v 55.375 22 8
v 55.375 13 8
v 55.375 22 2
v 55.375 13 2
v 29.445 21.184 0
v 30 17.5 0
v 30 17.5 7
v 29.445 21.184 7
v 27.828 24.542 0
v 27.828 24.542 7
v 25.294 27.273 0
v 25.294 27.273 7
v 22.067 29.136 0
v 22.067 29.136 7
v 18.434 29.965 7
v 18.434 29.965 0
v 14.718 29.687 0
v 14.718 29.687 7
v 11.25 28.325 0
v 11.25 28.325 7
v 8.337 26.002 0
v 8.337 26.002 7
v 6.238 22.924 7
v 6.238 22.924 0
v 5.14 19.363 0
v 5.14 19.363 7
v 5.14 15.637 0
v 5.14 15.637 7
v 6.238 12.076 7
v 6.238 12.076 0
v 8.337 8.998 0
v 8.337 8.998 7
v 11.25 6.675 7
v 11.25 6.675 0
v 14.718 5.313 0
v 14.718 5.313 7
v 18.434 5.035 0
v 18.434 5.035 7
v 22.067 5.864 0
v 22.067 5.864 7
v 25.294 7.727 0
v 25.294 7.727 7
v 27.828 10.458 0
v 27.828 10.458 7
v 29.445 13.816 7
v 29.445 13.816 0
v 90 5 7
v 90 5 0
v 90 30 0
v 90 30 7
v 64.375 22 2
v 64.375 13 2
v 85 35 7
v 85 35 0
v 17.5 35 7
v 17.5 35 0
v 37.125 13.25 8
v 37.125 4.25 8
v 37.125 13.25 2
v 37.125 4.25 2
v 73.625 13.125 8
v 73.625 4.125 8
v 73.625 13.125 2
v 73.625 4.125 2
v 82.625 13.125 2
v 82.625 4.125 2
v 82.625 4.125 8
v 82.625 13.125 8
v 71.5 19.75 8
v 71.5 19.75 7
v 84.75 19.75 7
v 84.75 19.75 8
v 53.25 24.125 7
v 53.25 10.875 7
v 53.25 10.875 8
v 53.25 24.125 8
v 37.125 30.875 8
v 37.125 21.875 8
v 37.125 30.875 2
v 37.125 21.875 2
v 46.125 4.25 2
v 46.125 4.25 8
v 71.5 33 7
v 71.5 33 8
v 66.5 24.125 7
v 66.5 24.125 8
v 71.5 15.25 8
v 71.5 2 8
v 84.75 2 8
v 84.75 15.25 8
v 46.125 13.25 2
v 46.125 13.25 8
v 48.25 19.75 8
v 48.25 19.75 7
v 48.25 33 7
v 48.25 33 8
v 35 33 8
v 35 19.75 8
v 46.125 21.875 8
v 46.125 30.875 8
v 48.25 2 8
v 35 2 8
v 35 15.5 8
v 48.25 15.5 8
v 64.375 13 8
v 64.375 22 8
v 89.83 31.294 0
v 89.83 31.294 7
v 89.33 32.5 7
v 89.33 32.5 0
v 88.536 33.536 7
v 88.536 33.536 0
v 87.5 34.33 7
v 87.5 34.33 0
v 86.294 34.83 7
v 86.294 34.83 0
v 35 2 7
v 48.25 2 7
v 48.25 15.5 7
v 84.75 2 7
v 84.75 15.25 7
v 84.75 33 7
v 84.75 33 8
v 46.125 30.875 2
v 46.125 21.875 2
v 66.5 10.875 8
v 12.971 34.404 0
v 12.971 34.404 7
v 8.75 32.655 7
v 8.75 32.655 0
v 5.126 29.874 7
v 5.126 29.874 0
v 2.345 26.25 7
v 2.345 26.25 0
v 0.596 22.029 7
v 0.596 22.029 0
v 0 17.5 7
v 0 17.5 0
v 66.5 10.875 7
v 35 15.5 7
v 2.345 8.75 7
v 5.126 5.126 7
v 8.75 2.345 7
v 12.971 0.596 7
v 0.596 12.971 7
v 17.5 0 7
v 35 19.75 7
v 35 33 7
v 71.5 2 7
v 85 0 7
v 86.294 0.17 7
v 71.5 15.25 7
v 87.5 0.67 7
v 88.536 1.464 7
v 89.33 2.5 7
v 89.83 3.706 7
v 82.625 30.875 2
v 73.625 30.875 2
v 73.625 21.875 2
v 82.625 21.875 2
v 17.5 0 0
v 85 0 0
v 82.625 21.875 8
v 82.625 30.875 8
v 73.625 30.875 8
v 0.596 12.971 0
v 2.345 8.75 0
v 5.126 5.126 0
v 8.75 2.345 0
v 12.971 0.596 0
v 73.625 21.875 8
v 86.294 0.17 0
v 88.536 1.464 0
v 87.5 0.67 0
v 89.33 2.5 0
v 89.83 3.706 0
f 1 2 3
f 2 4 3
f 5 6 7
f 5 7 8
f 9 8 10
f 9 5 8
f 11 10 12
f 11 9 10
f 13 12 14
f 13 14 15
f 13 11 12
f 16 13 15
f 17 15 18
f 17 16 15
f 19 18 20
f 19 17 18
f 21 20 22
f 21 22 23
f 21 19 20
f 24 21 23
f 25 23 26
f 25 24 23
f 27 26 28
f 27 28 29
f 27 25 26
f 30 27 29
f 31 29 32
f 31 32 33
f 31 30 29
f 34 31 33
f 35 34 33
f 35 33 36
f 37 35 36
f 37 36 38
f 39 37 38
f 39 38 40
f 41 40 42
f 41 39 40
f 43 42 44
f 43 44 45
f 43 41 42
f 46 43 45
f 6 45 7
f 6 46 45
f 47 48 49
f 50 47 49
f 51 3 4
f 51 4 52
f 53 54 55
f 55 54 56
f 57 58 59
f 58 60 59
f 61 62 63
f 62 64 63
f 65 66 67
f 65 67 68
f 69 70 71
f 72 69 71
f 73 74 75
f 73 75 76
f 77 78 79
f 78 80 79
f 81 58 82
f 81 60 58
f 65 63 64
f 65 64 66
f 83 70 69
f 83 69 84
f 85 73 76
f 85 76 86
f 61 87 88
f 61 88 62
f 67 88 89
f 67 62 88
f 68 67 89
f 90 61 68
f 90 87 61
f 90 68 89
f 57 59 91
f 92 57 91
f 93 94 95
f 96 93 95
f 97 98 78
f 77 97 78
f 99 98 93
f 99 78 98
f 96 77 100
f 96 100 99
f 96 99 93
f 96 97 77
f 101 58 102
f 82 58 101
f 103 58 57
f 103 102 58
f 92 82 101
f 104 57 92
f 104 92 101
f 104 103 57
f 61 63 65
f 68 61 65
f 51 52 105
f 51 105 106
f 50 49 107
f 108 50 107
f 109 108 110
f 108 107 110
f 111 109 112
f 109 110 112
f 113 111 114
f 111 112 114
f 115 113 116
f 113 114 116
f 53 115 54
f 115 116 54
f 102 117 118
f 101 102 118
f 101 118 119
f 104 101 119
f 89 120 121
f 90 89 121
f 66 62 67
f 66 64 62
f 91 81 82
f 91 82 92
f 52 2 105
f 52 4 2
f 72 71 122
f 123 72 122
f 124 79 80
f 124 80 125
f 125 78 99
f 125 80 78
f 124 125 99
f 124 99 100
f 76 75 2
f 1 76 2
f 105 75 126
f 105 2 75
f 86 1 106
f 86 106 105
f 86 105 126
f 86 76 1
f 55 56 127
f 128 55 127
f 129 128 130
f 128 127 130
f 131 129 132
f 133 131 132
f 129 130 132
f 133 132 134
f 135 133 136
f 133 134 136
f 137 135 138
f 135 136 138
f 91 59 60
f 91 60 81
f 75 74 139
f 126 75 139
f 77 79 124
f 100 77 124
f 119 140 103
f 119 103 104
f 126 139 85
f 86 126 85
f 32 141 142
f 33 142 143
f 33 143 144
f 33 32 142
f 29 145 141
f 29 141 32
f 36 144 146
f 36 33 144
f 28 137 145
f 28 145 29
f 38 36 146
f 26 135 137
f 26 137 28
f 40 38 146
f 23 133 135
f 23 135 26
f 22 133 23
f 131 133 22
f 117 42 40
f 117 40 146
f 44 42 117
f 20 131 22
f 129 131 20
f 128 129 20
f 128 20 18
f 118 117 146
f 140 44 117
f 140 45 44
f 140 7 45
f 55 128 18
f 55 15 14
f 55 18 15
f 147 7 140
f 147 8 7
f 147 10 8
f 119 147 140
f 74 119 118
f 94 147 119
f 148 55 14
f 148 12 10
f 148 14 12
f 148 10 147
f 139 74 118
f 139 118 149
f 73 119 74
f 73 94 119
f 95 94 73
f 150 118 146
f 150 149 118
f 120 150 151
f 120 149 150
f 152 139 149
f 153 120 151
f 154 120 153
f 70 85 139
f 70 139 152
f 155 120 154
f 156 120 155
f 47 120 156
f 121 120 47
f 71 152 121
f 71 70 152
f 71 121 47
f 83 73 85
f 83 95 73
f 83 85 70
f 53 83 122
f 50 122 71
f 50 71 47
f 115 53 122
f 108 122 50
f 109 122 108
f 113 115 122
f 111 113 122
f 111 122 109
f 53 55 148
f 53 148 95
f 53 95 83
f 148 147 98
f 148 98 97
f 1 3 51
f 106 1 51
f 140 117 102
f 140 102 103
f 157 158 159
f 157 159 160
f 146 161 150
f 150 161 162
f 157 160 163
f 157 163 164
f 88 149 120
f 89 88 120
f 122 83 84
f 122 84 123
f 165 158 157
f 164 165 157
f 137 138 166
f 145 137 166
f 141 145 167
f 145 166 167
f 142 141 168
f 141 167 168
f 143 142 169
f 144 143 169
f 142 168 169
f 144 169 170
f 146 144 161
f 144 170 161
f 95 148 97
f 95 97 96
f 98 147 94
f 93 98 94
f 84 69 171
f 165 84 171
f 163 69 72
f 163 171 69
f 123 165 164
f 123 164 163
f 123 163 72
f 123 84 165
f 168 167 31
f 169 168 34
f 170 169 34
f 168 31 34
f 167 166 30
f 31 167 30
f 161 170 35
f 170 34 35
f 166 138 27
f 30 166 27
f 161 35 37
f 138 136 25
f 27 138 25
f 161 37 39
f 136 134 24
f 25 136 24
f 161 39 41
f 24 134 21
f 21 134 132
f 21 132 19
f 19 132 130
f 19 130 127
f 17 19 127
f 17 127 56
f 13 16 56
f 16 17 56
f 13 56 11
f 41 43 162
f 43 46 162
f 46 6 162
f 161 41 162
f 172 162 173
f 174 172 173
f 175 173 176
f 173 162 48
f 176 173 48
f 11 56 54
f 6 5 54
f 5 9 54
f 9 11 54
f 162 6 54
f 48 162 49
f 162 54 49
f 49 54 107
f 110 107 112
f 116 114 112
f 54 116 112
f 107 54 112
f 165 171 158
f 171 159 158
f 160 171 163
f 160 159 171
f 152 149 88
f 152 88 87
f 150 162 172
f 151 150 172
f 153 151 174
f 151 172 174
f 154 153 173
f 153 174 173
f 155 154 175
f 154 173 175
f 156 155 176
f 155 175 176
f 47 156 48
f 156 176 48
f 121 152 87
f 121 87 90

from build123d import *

# Parameters (mm, degrees)
F0_R     = 12.5
F1_DEPTH = 7
F2_W     = 13.25
F2_H     = 13.25
F2_W_2   = 9
F2_H_2   = 9
F2_H_3   = 13.5
F3_DEPTH = 1
F4_DEPTH = 5


with BuildPart() as f1:
    # F0 (on Top) → F1 (new body)
    with BuildSketch(Plane.XY):
        with BuildLine():
            ThreePointArc((0, 17.5), (5.125631, 5.125631), (17.5, 0))
            Line((17.5, 0), (85, 0))
            ThreePointArc((85, 0), (88.535534, 1.464466), (90, 5))
            Line((90, 5), (90, 30))
            ThreePointArc((90, 30), (88.535534, 33.535534), (85, 35))
            Line((85, 35), (17.5, 35))
            ThreePointArc((17.5, 35), (5.125631, 29.874369), (0, 17.5))
        make_face()
        with Locations((17.5, 17.5)):
            Circle(F0_R, mode=Mode.SUBTRACT)
    extrude(amount=F1_DEPTH)

    # F2 (on face) → F3 (join)
    with BuildSketch(Plane.XY.offset(7)):
        with Locations((41.625, 26.375)):
            Rectangle(F2_W, F2_H)
        with Locations((41.625, 26.375)):
            Rectangle(F2_W_2, F2_H_2, mode=Mode.SUBTRACT)
        with Locations((41.625, 8.75)):
            Rectangle(F2_W, F2_H_3)
        with Locations((41.625, 8.75)):
            Rectangle(F2_W_2, F2_H_2, mode=Mode.SUBTRACT)
        with Locations((59.875, 17.5)):
            Rectangle(F2_W, F2_H)
        with Locations((59.875, 17.5)):
            Rectangle(F2_W_2, F2_H_2, mode=Mode.SUBTRACT)
        with Locations((78.125, 8.625)):
            Rectangle(F2_W, F2_H)
        with Locations((78.125, 8.625)):
            Rectangle(F2_W_2, F2_H_2, mode=Mode.SUBTRACT)
        with Locations((78.125, 26.375)):
            Rectangle(F2_W, F2_H)
        with Locations((78.125, 26.375)):
            Rectangle(F2_W_2, F2_H_2, mode=Mode.SUBTRACT)
    extrude(amount=F3_DEPTH)

    # F2 (on face) → F4 (cut)
    with BuildSketch(Plane.XY.offset(7)):
        with Locations((41.625, 26.375)):
            Rectangle(F2_W_2, F2_H_2)
        with Locations((41.625, 8.75)):
            Rectangle(F2_W_2, F2_H_2)
        with Locations((59.875, 17.5)):
            Rectangle(F2_W_2, F2_H_2)
        with Locations((78.125, 26.375)):
            Rectangle(F2_W_2, F2_H_2)
        with Locations((78.125, 8.625)):
            Rectangle(F2_W_2, F2_H_2)
    extrude(amount=-F4_DEPTH, mode=Mode.SUBTRACT)


solid = f1.part
